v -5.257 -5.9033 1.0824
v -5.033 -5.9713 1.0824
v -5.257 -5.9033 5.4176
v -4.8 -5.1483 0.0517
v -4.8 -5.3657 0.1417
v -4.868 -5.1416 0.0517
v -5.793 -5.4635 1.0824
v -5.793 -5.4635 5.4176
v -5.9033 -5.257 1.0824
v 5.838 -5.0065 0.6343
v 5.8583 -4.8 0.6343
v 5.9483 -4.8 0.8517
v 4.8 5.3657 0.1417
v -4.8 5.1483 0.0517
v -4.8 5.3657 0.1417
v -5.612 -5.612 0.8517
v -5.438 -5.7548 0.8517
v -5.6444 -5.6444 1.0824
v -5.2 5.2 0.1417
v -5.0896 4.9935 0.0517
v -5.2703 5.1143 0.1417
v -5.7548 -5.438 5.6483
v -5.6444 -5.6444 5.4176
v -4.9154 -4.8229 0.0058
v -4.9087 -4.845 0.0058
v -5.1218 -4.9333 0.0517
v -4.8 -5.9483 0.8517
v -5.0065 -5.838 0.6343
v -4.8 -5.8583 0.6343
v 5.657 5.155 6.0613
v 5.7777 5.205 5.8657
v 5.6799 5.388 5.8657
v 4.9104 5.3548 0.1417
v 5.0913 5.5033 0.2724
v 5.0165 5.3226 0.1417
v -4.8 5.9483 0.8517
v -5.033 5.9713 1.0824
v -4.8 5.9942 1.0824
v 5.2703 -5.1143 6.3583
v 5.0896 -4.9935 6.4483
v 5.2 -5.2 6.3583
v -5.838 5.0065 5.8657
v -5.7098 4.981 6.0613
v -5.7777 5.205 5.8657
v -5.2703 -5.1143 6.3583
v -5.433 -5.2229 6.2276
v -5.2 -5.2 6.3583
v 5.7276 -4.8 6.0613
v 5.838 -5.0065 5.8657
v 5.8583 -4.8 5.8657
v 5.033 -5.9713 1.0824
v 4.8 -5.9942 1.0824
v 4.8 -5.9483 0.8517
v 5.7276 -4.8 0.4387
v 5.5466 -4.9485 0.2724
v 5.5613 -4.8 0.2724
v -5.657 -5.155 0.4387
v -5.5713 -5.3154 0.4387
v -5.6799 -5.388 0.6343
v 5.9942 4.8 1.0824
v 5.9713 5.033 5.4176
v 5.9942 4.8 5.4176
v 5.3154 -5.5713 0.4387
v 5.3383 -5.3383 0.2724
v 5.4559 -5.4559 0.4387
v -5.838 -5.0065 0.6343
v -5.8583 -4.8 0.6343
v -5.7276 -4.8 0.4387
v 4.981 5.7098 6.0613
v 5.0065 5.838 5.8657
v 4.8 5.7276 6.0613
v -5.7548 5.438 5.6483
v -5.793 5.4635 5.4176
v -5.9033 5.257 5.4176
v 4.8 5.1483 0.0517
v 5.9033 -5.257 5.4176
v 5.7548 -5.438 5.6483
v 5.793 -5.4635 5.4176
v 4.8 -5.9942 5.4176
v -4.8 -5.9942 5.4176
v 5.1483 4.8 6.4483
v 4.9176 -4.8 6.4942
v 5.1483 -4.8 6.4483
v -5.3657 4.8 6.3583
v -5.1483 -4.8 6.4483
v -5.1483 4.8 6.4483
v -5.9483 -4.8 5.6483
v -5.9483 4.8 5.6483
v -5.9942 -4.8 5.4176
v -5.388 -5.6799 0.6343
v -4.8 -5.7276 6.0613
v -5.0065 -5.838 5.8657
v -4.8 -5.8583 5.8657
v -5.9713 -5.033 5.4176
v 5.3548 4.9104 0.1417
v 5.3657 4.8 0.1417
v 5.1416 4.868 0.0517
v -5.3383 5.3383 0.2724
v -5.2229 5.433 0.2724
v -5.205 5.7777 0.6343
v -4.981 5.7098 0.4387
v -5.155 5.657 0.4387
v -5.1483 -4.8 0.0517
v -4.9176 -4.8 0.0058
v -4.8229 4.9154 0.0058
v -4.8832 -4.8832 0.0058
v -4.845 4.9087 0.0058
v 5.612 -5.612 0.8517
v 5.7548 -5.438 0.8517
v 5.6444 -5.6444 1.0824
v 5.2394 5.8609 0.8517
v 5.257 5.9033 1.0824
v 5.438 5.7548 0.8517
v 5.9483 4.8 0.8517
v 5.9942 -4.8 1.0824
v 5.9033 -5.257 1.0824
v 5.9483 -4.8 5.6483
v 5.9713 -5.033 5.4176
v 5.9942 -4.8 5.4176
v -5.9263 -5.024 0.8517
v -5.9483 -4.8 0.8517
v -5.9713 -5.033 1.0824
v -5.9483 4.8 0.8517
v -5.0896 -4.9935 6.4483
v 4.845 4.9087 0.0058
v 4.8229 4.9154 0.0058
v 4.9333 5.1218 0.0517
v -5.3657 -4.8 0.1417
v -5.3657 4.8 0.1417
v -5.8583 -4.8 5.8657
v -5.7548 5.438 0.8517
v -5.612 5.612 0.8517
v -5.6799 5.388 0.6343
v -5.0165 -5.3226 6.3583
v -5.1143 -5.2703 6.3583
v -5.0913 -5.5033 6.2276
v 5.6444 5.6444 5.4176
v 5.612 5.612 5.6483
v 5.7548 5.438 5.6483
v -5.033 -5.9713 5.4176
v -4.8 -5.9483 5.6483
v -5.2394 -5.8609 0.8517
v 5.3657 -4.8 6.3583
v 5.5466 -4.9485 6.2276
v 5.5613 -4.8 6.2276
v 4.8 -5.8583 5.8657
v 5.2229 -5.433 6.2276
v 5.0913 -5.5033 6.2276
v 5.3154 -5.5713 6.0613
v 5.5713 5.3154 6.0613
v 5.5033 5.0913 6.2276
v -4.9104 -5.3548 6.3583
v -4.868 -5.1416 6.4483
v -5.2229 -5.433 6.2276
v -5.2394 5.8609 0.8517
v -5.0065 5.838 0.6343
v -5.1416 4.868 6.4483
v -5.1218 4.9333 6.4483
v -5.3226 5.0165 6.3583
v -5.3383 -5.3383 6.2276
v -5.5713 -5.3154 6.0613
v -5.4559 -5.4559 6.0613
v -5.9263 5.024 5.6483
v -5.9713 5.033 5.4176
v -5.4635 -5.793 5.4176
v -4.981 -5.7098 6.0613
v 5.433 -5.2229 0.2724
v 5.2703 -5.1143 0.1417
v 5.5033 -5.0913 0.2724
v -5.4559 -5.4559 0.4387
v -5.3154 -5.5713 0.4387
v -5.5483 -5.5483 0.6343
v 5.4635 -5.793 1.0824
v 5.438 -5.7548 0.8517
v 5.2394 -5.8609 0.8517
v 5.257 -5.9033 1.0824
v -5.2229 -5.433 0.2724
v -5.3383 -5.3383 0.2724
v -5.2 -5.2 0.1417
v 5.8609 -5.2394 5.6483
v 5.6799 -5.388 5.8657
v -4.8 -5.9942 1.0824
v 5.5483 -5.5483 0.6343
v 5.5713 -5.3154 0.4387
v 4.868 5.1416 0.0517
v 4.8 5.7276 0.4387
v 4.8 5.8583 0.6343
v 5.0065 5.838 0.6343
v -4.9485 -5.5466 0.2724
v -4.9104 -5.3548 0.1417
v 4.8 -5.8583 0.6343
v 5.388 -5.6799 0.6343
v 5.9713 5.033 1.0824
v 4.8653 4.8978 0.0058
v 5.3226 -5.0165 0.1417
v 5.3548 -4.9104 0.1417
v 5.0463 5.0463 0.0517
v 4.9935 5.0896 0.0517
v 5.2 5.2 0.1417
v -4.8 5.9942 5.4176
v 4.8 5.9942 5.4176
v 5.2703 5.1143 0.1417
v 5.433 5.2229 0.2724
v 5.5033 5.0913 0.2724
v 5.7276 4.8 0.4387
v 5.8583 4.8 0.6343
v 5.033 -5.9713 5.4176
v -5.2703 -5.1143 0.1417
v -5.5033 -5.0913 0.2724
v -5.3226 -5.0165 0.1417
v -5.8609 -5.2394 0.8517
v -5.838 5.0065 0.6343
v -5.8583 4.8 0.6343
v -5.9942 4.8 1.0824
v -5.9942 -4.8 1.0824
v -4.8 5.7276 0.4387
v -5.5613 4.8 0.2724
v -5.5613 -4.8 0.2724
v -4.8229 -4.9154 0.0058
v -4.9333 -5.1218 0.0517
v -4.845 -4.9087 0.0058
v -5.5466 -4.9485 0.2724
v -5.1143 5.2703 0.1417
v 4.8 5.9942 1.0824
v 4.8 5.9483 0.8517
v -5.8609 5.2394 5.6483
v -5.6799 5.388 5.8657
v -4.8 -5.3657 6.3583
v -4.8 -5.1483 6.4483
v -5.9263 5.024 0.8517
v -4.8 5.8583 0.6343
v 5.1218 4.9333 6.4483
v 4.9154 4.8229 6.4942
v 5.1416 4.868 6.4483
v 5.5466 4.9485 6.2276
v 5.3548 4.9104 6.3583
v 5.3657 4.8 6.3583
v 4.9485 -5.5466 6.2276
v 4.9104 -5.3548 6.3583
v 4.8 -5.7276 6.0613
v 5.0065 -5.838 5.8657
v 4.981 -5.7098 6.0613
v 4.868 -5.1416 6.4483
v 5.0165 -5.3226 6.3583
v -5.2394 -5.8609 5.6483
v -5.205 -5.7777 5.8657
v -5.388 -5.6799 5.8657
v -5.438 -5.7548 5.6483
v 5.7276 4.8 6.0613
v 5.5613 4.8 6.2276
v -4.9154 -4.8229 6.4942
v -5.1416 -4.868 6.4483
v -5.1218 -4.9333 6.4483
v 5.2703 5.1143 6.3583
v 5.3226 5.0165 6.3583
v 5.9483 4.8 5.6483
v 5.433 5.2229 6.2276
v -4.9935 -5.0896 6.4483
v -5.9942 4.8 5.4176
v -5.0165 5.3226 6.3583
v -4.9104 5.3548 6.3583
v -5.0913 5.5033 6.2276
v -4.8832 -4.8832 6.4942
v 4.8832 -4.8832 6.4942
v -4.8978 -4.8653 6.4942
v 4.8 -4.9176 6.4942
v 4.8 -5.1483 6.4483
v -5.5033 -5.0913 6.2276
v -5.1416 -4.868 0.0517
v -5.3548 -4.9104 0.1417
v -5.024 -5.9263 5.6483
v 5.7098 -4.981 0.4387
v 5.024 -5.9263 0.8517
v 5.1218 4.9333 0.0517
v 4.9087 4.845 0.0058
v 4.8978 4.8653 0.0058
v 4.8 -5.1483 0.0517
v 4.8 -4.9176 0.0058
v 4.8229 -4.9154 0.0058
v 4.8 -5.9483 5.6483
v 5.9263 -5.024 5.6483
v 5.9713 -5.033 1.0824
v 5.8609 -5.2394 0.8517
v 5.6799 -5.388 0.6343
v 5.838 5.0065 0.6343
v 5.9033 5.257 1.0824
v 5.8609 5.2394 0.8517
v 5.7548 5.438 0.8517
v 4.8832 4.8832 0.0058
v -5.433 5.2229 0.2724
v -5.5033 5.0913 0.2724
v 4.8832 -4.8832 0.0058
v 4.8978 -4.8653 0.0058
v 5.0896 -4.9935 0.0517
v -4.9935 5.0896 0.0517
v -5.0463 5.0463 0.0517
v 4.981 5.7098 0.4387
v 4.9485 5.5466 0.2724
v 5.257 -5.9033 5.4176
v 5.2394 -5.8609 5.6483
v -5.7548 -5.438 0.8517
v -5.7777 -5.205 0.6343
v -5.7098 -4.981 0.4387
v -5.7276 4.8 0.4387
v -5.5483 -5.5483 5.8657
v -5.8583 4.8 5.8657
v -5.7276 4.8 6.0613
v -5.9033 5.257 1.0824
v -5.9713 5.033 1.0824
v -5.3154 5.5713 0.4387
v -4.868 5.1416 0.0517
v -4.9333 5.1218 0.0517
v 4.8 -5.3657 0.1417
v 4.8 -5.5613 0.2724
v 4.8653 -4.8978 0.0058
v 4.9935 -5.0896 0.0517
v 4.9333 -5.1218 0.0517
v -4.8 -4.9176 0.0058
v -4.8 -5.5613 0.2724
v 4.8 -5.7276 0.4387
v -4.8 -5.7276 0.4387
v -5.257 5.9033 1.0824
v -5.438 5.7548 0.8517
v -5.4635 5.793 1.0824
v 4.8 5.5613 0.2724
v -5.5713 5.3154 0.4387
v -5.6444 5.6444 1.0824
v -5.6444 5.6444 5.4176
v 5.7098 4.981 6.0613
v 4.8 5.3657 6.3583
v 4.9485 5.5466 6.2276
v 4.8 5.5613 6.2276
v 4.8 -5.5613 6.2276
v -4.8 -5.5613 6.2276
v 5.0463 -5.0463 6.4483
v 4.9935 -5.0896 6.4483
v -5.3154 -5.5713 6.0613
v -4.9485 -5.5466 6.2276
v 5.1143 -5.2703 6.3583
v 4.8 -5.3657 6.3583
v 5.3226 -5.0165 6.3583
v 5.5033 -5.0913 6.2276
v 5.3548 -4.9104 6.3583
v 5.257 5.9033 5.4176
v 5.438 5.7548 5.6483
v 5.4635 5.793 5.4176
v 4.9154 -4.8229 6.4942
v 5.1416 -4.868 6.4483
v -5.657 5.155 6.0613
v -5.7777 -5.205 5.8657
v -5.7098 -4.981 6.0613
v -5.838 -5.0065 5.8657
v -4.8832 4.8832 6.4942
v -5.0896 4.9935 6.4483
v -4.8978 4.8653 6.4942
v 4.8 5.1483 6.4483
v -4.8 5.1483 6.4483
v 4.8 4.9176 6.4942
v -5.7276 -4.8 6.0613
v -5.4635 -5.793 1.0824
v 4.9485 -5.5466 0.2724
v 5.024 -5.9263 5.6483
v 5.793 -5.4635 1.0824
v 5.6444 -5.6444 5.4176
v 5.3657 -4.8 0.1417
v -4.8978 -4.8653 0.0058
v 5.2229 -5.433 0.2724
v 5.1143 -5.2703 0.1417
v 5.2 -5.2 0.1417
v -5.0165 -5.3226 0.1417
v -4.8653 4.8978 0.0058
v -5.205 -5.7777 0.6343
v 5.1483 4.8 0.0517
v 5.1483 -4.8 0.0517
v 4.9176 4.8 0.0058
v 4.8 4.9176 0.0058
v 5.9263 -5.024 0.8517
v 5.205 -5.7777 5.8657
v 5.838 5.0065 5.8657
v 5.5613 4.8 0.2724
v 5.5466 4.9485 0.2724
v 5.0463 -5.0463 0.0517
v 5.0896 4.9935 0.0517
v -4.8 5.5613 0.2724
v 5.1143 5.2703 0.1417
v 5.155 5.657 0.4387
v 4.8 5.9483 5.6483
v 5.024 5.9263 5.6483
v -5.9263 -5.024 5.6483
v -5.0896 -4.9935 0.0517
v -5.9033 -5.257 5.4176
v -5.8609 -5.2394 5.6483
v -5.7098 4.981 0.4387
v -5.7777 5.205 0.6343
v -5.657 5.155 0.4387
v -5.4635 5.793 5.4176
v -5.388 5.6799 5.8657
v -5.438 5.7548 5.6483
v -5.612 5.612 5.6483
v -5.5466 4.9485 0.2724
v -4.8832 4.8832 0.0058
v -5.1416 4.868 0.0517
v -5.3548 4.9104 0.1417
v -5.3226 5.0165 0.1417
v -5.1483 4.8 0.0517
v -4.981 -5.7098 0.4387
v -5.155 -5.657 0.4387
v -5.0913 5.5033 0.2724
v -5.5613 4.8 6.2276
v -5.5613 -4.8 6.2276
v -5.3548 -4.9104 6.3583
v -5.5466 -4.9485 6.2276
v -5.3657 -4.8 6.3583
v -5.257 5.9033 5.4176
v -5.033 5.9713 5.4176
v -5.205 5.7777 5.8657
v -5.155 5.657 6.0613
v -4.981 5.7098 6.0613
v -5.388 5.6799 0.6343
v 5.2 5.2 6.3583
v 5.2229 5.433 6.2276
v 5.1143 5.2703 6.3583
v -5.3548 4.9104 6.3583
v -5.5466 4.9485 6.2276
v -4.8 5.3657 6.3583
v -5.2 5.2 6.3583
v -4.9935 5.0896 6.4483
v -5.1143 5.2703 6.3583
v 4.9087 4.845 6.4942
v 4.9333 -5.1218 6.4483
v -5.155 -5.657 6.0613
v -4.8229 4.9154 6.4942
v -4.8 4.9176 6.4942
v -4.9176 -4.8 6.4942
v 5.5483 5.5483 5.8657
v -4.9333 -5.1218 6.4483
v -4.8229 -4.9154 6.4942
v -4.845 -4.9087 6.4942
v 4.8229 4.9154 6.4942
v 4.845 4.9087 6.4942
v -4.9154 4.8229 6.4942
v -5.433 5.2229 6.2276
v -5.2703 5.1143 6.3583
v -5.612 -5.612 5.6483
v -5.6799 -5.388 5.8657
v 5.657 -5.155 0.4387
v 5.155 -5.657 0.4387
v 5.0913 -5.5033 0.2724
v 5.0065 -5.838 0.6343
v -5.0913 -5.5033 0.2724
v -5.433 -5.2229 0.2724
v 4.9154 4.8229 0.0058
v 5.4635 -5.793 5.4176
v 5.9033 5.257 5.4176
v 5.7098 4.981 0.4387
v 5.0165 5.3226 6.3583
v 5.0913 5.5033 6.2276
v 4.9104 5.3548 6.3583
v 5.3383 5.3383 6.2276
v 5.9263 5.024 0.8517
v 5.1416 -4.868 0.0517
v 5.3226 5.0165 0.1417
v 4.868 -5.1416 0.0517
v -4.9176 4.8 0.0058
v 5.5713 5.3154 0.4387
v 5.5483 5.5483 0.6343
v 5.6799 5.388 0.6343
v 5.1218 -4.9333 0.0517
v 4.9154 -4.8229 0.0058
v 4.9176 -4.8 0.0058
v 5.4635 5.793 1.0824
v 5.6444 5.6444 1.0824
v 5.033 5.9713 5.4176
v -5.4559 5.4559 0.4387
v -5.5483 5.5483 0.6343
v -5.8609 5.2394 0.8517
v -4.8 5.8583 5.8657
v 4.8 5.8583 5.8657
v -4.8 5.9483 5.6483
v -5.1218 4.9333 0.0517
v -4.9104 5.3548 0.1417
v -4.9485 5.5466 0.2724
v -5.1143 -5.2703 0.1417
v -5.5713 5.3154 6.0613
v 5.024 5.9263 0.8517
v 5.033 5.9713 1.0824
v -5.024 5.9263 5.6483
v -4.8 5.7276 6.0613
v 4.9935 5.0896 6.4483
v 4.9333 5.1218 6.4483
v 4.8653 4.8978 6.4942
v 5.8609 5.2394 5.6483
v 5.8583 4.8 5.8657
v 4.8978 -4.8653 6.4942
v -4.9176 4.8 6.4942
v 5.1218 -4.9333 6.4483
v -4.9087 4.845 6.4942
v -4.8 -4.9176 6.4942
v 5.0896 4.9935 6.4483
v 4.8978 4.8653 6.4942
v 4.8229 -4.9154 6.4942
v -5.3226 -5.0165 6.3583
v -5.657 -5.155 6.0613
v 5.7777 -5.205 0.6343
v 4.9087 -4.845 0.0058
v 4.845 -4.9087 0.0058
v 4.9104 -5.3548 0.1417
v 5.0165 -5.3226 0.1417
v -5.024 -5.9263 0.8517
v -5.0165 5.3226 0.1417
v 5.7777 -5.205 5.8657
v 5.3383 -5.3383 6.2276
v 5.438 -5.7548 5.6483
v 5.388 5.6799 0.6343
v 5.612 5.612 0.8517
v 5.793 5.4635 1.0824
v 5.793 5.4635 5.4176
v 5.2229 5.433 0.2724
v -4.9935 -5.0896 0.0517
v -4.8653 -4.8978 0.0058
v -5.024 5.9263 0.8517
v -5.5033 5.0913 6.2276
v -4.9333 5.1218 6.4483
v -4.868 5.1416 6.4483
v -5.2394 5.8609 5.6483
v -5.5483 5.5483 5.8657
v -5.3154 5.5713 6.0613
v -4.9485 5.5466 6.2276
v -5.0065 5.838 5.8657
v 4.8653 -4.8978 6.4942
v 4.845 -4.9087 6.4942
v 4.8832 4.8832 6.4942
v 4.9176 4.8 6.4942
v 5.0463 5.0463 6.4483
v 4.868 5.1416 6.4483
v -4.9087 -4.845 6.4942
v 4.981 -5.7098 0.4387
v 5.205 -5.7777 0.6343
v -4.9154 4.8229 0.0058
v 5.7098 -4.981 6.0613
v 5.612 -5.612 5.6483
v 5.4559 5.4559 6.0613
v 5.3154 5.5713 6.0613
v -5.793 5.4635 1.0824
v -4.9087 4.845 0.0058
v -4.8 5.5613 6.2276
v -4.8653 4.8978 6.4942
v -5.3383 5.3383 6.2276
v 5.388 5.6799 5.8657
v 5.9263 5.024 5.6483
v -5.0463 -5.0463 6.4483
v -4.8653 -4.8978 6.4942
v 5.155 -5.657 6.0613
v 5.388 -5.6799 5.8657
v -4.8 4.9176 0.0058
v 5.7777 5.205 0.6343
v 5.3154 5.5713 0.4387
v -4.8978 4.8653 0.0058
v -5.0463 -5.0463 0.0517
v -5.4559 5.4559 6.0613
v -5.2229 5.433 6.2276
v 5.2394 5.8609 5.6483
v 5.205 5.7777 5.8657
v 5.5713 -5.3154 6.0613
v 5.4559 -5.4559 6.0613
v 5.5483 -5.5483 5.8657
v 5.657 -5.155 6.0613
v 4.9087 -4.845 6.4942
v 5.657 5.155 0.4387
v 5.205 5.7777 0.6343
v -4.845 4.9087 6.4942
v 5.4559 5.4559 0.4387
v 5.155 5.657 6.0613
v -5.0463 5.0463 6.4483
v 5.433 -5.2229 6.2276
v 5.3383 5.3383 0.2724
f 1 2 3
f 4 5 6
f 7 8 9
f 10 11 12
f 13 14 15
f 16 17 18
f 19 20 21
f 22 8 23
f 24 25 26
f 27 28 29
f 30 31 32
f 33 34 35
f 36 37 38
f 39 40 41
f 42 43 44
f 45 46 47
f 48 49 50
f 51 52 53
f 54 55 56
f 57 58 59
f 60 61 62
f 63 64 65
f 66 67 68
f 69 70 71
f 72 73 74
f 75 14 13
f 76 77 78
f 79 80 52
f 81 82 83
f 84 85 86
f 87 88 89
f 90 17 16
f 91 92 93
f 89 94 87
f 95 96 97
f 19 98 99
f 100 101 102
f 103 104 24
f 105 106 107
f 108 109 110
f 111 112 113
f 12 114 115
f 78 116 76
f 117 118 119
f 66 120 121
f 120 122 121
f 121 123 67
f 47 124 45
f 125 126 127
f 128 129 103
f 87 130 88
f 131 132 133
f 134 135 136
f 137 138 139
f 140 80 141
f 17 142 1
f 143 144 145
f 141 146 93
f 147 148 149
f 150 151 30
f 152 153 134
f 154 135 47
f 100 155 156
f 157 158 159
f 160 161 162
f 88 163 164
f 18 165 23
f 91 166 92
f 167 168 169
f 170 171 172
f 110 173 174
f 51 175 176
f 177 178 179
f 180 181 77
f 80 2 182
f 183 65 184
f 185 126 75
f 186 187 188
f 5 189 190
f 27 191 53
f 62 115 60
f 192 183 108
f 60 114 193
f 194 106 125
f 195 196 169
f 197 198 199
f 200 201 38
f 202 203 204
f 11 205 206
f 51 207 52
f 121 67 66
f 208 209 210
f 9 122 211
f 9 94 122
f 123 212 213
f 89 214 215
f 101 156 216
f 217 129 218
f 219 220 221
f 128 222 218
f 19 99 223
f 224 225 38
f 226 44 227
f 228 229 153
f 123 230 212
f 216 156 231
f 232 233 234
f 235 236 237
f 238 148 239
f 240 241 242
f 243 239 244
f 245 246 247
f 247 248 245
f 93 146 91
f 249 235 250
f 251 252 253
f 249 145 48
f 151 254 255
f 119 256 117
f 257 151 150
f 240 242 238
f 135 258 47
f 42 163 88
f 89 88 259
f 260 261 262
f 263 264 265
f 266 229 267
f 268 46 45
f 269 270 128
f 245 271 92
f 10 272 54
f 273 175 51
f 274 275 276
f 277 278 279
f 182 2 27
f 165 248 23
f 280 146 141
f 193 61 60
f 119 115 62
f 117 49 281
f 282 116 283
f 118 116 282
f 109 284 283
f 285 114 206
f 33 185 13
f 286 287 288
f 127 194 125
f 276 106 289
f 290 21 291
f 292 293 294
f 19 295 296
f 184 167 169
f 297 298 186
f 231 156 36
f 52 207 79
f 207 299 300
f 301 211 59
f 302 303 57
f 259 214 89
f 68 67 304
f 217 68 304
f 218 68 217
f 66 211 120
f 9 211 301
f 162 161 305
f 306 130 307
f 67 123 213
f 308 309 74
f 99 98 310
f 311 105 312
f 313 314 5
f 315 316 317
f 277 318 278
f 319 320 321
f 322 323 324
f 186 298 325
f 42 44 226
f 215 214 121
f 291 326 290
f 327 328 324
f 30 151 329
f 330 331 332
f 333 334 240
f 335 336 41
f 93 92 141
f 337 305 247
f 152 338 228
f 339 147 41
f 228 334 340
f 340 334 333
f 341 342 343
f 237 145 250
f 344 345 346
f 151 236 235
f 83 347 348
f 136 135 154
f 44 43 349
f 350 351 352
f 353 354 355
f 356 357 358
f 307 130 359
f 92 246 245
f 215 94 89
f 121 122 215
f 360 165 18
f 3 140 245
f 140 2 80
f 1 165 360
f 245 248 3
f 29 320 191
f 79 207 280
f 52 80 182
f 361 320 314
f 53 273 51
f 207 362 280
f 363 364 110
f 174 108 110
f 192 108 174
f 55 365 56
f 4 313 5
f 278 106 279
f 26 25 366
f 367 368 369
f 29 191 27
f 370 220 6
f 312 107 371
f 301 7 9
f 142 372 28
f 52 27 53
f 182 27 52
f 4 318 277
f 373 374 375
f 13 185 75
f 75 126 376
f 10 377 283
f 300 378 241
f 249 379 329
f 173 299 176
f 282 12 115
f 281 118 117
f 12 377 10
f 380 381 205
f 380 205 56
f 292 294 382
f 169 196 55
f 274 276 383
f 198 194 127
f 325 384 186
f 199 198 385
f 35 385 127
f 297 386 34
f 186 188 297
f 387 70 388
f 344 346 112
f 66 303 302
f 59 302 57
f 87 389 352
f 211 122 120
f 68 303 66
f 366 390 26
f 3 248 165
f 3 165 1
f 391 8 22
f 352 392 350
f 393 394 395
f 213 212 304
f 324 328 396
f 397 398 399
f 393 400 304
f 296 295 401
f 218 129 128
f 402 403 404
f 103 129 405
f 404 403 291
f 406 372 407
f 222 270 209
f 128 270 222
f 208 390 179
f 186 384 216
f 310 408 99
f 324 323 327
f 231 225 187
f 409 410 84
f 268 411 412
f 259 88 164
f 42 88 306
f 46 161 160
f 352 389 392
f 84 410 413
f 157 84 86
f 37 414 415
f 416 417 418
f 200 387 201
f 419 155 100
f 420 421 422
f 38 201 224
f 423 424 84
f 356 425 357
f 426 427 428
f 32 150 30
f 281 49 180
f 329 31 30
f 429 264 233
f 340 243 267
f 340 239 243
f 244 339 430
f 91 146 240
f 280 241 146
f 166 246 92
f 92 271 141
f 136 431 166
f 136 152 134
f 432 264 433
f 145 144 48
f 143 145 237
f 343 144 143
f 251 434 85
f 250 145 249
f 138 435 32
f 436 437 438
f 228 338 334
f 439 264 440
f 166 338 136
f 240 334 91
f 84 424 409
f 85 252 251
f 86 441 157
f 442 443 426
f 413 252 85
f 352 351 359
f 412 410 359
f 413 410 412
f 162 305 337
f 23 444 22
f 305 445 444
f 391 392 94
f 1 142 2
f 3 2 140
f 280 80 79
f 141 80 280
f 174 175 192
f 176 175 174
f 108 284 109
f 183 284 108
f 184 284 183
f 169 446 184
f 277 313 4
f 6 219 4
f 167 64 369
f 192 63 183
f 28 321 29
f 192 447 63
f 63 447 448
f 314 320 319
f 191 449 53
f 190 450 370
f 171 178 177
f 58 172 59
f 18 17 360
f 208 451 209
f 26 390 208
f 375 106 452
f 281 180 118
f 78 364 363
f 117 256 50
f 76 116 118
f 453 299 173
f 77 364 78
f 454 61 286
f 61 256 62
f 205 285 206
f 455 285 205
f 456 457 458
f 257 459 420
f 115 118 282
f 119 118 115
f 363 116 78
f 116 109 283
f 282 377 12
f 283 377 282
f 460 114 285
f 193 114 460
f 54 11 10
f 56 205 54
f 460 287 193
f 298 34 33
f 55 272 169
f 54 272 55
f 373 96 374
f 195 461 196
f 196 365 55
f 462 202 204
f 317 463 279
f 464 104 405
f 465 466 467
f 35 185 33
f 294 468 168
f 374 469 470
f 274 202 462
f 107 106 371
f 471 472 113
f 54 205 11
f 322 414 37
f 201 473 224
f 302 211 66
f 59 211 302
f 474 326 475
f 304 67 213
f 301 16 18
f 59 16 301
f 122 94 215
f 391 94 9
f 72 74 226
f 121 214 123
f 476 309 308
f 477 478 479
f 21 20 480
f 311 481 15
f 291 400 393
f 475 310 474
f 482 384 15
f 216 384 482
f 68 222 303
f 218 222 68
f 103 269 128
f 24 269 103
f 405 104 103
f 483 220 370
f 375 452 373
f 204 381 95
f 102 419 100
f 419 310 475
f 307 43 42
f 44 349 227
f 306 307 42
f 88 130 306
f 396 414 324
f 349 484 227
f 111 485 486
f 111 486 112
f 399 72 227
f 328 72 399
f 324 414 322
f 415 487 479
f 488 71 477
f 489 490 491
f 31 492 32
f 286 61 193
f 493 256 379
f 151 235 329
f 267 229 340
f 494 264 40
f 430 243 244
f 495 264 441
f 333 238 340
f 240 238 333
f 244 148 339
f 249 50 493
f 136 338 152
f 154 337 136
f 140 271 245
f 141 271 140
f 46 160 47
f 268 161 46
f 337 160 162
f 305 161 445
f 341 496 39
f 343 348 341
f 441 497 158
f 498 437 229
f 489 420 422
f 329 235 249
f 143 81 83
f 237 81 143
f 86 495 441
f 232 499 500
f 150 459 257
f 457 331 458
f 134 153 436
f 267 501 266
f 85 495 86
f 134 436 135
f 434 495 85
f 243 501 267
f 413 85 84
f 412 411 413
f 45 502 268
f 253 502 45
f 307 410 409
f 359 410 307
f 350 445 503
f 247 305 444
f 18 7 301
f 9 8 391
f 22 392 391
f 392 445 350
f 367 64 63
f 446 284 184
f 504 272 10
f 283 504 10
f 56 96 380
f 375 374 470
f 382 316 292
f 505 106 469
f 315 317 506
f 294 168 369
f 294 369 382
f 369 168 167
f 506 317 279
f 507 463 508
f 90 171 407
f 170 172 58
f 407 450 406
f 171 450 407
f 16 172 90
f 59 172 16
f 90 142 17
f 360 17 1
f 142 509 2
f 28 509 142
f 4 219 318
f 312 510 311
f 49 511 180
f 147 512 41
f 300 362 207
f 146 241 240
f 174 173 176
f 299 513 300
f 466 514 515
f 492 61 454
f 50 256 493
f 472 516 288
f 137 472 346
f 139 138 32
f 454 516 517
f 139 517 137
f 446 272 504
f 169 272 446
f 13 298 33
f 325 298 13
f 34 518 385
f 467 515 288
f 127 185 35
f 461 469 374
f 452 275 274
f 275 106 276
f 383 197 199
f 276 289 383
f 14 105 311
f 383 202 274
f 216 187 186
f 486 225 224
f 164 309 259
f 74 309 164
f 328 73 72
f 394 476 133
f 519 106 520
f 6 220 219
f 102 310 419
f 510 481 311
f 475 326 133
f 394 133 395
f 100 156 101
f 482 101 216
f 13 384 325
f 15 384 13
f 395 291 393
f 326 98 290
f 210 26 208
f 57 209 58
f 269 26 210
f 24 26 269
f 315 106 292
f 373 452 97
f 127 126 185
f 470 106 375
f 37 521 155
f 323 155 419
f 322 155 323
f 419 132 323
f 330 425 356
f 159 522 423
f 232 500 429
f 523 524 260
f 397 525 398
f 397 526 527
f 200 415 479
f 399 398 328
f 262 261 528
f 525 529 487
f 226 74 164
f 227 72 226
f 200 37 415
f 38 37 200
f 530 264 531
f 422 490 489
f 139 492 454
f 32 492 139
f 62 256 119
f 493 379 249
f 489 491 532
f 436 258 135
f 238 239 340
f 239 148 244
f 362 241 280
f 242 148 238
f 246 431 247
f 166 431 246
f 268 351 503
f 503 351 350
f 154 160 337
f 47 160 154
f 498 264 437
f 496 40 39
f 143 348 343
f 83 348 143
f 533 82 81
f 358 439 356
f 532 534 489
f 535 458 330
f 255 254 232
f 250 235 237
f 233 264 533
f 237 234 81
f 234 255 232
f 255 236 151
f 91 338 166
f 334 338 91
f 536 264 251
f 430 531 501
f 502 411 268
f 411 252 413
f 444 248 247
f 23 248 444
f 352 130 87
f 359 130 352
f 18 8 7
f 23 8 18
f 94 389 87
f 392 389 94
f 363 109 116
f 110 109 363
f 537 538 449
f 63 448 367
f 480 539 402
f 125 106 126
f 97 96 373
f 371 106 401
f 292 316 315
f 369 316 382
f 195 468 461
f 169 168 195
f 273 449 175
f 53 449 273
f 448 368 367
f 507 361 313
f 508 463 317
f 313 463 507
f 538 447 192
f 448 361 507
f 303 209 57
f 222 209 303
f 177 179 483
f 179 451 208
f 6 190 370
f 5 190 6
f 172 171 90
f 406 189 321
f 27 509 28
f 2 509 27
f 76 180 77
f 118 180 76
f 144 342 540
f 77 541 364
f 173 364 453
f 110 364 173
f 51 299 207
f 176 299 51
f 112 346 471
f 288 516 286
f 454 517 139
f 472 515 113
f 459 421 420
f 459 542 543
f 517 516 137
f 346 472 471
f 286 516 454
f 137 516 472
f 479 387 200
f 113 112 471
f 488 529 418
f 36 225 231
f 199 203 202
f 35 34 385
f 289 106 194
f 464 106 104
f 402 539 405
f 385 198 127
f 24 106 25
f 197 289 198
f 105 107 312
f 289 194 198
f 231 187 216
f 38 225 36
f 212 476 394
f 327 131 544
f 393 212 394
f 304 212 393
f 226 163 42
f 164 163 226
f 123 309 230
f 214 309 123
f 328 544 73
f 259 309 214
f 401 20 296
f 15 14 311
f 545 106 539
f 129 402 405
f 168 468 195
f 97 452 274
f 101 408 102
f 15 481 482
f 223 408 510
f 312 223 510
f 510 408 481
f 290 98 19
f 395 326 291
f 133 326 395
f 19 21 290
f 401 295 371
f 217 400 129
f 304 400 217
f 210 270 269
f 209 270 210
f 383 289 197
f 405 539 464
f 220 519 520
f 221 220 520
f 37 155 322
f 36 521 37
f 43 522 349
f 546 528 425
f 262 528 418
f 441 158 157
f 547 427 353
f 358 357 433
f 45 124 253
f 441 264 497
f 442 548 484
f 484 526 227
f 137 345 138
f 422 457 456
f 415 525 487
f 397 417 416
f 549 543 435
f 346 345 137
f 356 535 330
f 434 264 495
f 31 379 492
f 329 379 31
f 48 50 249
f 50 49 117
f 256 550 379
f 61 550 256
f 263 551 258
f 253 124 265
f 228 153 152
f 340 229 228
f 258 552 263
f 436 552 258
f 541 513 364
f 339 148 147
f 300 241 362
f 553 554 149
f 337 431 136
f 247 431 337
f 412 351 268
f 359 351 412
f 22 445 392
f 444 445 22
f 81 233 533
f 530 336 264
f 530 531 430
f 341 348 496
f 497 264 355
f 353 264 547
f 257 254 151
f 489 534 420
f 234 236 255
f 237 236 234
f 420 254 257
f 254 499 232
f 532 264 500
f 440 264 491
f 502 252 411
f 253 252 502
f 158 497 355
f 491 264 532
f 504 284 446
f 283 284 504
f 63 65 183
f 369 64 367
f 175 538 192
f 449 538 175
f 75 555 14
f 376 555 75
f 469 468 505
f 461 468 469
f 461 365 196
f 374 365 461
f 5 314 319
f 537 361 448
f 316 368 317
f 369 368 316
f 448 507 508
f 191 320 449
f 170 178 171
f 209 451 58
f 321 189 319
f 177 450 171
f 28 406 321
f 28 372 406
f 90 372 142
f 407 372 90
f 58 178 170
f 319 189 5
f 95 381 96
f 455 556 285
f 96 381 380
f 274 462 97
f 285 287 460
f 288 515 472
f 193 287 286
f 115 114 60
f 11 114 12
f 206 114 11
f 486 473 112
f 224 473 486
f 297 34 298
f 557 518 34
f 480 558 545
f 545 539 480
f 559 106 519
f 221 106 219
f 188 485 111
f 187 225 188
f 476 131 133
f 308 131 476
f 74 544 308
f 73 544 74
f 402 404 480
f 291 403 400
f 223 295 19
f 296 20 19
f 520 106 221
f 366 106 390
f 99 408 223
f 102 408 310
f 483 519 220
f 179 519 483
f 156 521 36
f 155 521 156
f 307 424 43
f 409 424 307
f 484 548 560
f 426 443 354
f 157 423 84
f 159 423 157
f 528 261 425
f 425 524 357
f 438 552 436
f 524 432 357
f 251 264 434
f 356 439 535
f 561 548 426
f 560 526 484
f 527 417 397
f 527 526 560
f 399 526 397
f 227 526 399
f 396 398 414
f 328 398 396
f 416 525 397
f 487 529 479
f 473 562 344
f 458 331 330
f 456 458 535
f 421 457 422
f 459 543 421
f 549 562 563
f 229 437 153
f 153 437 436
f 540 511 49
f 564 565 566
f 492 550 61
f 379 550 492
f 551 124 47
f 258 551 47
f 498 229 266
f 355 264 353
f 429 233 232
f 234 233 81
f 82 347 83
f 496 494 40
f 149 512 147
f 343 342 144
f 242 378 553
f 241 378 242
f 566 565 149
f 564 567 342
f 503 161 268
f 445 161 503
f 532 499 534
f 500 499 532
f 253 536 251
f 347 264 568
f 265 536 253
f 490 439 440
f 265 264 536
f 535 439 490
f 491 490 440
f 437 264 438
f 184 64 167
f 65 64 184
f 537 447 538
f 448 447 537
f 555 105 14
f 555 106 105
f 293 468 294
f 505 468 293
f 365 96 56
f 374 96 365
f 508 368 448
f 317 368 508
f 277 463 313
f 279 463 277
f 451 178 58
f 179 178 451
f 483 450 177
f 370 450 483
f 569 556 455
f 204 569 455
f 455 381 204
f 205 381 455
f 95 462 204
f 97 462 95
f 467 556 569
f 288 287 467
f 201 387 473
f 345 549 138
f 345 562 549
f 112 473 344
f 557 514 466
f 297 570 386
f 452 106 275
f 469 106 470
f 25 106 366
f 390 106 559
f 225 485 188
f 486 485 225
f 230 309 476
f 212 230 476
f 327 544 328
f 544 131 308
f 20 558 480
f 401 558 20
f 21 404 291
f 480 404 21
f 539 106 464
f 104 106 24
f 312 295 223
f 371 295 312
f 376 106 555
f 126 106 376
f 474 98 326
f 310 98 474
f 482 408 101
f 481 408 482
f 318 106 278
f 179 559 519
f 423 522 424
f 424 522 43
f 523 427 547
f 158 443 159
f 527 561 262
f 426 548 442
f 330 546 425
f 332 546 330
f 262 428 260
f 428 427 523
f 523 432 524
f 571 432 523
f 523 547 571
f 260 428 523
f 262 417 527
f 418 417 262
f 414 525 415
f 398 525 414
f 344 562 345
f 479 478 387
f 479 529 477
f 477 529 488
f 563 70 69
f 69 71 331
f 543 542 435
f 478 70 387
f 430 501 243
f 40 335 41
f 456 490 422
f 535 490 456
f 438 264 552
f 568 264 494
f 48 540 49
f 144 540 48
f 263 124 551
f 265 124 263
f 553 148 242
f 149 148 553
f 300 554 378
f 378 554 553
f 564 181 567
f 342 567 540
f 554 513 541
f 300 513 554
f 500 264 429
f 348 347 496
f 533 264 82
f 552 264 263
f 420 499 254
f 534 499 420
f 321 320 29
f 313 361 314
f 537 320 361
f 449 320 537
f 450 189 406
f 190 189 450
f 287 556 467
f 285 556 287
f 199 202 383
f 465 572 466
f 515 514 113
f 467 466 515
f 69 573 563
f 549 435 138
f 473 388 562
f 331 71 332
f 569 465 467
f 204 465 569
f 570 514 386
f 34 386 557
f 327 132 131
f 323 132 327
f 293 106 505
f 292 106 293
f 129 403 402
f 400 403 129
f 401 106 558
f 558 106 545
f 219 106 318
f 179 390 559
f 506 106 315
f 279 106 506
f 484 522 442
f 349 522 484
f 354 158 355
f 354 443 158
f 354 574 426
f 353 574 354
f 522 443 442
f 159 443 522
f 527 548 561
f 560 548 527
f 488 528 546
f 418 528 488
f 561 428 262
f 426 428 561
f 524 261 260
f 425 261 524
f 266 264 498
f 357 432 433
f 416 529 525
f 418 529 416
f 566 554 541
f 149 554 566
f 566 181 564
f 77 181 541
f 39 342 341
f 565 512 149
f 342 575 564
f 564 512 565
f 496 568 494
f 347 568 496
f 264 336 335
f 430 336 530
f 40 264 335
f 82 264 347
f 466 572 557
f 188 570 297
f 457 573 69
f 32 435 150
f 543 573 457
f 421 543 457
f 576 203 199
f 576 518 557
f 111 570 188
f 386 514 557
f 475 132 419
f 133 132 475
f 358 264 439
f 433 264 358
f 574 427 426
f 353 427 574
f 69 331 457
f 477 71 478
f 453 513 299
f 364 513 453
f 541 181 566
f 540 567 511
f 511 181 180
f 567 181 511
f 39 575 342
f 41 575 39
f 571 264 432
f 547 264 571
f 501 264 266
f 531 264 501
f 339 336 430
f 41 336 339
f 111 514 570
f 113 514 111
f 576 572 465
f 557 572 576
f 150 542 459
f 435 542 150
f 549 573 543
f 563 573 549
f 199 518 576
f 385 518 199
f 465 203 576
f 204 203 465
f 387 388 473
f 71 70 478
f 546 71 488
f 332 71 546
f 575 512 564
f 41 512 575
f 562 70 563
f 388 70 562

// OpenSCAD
// Push Button 12mm (12mm 按鈕) visual source for NexCAD.
// Units: millimeters. Origin: part bottom-center, matching src/parts/library.ts.
// This generated baseline is intentionally simple; refine it with measured details before exporting STL.

$fn = 32;

module rounded_box(size, r = 0.8) {
  hull() {
    for (x = [-size[0] / 2 + r, size[0] / 2 - r])
      for (y = [-size[1] / 2 + r, size[1] / 2 - r]) {
        translate([x, y, r]) sphere(r = r);
        translate([x, y, size[2] - r]) sphere(r = r);
      }
  }
}

color("#2e7d5b") rounded_box([12, 12, 6.5], min(1.2, min(12, 12) / 8));
